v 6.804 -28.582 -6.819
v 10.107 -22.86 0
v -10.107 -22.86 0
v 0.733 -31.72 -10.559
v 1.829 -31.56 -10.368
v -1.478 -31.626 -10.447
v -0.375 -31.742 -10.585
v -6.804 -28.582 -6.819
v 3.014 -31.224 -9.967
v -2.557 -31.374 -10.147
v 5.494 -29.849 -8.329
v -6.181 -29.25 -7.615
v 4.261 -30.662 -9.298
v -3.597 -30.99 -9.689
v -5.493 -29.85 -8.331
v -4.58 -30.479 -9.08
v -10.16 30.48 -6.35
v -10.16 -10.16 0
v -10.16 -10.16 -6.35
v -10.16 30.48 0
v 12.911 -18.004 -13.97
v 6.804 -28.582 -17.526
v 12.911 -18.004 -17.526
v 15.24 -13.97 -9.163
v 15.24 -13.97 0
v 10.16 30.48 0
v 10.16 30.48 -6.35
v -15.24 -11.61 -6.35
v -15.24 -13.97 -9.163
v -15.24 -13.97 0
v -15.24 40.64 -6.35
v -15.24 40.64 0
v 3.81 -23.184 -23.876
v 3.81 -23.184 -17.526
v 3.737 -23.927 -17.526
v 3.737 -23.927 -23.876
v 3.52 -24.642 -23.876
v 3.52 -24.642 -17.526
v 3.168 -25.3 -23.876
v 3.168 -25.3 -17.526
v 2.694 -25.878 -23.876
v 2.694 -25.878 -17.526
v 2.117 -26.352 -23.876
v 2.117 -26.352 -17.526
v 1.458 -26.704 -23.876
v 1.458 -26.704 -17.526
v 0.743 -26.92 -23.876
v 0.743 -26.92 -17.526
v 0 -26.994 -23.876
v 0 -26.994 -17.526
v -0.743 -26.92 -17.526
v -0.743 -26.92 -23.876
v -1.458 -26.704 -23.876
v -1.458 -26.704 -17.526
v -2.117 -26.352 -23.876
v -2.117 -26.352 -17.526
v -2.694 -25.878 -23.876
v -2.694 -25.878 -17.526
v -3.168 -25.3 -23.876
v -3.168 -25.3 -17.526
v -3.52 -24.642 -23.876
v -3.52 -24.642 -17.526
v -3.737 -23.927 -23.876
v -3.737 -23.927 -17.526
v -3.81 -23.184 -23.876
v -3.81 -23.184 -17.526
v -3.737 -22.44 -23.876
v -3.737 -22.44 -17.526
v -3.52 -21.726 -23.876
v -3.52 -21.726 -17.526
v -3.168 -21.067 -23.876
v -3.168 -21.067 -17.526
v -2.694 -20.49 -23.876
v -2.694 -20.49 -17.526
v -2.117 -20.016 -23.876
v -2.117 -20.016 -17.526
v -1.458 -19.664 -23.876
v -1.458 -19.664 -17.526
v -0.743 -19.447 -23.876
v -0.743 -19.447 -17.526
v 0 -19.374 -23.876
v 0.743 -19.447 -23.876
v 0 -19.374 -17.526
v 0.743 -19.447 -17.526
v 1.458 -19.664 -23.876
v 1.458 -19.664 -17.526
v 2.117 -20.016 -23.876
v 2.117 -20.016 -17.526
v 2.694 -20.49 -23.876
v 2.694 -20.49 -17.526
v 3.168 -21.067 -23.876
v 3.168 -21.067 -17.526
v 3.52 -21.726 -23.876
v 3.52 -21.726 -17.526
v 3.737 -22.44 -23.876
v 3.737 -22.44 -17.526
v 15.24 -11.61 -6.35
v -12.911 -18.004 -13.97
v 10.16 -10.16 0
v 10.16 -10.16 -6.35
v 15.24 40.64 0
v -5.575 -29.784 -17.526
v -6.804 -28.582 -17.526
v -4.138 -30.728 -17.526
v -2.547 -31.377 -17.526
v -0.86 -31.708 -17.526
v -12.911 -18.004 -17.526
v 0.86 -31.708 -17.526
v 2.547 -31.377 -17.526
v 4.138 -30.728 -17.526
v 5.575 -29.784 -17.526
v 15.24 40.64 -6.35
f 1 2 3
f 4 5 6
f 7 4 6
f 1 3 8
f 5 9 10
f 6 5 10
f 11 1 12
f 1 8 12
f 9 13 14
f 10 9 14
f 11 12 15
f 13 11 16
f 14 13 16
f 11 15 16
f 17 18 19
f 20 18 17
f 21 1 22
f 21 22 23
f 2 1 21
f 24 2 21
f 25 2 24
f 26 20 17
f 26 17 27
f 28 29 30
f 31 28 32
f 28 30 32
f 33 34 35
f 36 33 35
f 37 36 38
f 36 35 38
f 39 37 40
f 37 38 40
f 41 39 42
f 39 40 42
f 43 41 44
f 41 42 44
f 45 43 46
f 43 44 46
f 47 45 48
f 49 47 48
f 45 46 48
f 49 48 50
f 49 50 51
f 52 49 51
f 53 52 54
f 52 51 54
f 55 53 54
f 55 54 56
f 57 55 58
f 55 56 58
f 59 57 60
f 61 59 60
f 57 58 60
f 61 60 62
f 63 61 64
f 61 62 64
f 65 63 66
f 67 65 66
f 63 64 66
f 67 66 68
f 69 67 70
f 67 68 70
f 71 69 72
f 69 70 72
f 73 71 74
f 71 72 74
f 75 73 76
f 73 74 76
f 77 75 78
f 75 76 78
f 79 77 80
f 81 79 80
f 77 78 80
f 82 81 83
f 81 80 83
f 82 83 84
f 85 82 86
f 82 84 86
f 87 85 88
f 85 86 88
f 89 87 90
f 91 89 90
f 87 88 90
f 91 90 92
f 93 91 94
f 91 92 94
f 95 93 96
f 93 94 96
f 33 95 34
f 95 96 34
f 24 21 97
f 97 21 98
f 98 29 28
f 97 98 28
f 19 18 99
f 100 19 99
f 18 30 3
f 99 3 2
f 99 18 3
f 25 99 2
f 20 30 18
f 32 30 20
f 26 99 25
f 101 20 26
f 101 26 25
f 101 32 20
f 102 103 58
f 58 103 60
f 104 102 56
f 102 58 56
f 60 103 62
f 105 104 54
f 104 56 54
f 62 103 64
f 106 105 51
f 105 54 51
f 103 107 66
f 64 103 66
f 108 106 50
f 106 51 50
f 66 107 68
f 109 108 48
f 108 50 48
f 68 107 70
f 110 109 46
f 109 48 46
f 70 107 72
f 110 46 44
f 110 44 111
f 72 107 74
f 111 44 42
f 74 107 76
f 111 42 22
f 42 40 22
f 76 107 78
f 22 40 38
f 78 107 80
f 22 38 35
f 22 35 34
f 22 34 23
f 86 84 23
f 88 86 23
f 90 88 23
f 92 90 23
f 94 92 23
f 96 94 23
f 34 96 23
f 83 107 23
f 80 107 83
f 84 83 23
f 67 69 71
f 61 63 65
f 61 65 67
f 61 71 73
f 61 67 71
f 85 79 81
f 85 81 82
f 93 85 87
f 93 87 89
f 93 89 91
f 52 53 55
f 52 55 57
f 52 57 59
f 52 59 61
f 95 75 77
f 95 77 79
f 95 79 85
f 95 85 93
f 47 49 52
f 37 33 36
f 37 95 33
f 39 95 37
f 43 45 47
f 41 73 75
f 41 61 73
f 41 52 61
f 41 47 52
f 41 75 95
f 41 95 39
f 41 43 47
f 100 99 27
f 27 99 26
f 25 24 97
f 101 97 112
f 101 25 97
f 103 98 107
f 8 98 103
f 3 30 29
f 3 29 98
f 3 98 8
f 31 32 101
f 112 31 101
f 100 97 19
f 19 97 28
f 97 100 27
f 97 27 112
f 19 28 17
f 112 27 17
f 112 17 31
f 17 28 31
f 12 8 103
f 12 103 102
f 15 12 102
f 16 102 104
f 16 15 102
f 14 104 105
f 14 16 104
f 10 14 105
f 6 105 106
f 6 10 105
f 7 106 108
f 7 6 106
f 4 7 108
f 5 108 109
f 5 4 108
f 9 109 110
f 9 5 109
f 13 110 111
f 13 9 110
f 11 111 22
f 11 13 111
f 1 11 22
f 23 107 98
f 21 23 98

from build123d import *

# Parameters (mm, degrees)
F0_W     = 30.48
F0_H     = 54.61
F0_W_2   = 20.32
F0_H_2   = 40.64
F2_DEPTH = 17.526
F4_START = -25.4
F4_DEPTH = 40.641
F5_R     = 3.81
F6_DEPTH = 6.35


with BuildPart() as f2:
    # F0 (on Top) → F2 (new body)
    with BuildSketch(Plane.XY):
        with Locations((0, 13.335)):
            Rectangle(F0_W, F0_H)
        with Locations((0, 10.16)):
            Rectangle(F0_W_2, F0_H_2, mode=Mode.SUBTRACT)
        with BuildLine():
            Line((15.24, -13.97), (-15.24, -13.97))
            Line((-15.24, -13.97), (-6.8038069676, -28.5819149546))
            ThreePointArc((-6.8038069676, -28.5819149546), (0, -31.75), (6.8038069676, -28.5819149546))
            Line((6.8038069676, -28.5819149546), (15.24, -13.97))
        make_face()
    extrude(amount=-F2_DEPTH)

    # F3 (on Right) → F4 (intersect)
    with BuildSketch(Plane.YZ.offset(F4_START)):
        Polygon((40.7838374376, 0), (0, 0), (-22.86, 0), (-31.9106747376, -10.7861741339), (-31.9106747376, -17.527366057), (-18.003549273, -17.527366057), (-18.003549273, -13.97), (-11.6096100835, -6.35), (40.7838374376, -6.35), align=None)
    extrude(amount=F4_DEPTH, mode=Mode.INTERSECT)

    # F5 (on face) → F6 (join)
    with BuildSketch(Plane(origin=(0, 0, -17.526), x_dir=(1, 0, 0), z_dir=(0, 0, -1))):
        with Locations((0, 23.183679186)):
            Circle(F5_R)
    extrude(amount=F6_DEPTH)


solid = f2.part
